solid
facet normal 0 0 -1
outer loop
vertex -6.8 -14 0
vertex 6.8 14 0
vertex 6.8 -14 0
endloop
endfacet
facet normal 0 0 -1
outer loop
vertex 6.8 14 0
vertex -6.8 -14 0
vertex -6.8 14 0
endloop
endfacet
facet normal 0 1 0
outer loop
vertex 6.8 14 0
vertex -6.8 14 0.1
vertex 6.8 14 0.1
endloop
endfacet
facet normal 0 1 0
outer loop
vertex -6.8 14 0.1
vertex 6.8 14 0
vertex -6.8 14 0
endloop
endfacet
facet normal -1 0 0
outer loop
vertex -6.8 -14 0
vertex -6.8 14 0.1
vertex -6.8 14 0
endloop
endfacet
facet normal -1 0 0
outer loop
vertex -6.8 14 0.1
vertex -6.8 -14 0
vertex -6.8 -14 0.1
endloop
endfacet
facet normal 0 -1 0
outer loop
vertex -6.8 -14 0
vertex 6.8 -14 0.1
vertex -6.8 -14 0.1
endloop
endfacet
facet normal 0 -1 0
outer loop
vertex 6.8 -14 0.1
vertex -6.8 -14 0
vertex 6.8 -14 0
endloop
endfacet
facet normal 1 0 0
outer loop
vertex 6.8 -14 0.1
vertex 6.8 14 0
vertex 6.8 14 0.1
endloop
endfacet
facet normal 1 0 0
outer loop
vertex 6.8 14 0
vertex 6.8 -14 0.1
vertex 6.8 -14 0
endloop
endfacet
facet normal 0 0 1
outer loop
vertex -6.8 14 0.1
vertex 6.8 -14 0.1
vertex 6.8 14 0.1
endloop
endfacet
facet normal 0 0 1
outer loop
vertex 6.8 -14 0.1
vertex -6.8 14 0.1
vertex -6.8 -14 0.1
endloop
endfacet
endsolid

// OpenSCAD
// file: ../p/box5-12.scad
use <../lib.scad>
function ldraw_lib__box5_12() = [
// 0 Box with 5 Faces without Any Edges
// 0 Name: box5-12.dat
// 0 Author: Chris Dee [cwdee]
// 0 !LDRAW_ORG Primitive UPDATE 2009-02
// 0 !LICENSE Licensed under CC BY 2.0 and CC BY 4.0 : see CAreadme.txt
// 
// 0 BFC CERTIFY CCW
  [0,"BFC","CERTIFY"],
  [0,"BFC","CCW"],
// 
// 0 !HISTORY 2009-09-03 [PTadmin] Official Update 2009-02
// 
// 
// 4 16 1 1 1 1 1 -1 -1 1 -1 -1 1 1
  [4,16,1,1,1,1,1,-1,-1,1,-1,-1,1,1],
// 4 16 -1 0 1 1 0 1 1 1 1 -1 1 1
  [4,16,-1,0,1,1,0,1,1,1,1,-1,1,1],
// 4 16 -1 0 -1 -1 0 1 -1 1 1 -1 1 -1
  [4,16,-1,0,-1,-1,0,1,-1,1,1,-1,1,-1],
// 4 16 1 0 -1 -1 0 -1 -1 1 -1 1 1 -1
  [4,16,1,0,-1,-1,0,-1,-1,1,-1,1,1,-1],
// 4 16 1 0 1 1 0 -1 1 1 -1 1 1 1
  [4,16,1,0,1,1,0,-1,1,1,-1,1,1,1],
// 0
];
module ldraw_lib__box5_12(step=0, col=false, unit=2/5, alt=false, line=0.2, solid=!$preview)
    makepoly(ldraw_lib__box5_12(), step=step, col=col, unit=unit, alt=alt, line=line, solid=solid);
ldraw_lib__box5_12(line=0.2);
// main file
use <../lib.scad>
use <../p/box5-12.scad>
function ldraw_lib__u9481() = [
// 0 ~Sticker for Electric Motor 12V
// 0 Name: u9481.dat
// 0 Author: Alex Taylor [anathema]
// 0 !LDRAW_ORG Part UPDATE 2022-02
// 0 !LICENSE Licensed under CC BY 2.0 and CC BY 4.0 : see CAreadme.txt
// 
// 0 BFC CERTIFY CCW
  [0,"BFC","CERTIFY"],
  [0,"BFC","CCW"],
// 
// 0 !HISTORY 2022-03-06 [PTadmin] Official Update 2022-02
// 
// 
// 1 16 0 -0.25 0 17 0 0 0 0.25 0 0 0 35 box5-12.dat
  [1,16,0,-0.25,0,17,0,0,0,0.25,0,0,0,35, ldraw_lib__box5_12()],
// 0 !TEXMAP START PLANAR -17 -0.25 35 17 -0.25 35 -17 -0.25 -35 u9481.png
// 0 !: 4 16 -17 -0.25 -35 17 -0.25 -35 17 -0.25 35 -17 -0.25 35
// 0 !TEXMAP FALLBACK
// 4 15 -17 -0.25 -35 17 -0.25 -35 17 -0.25 35 -17 -0.25 35
  [4,15,-17,-0.25,-35,17,-0.25,-35,17,-0.25,35,-17,-0.25,35],
// 0 !TEXMAP END
// 0
];
module ldraw_lib__u9481(step=0, col=false, unit=2/5, alt=false, line=0.2, solid=!$preview)
    makepoly(ldraw_lib__u9481(), step=step, col=col, unit=unit, alt=alt, line=line, solid=solid);
ldraw_lib__u9481(line=0.2);
